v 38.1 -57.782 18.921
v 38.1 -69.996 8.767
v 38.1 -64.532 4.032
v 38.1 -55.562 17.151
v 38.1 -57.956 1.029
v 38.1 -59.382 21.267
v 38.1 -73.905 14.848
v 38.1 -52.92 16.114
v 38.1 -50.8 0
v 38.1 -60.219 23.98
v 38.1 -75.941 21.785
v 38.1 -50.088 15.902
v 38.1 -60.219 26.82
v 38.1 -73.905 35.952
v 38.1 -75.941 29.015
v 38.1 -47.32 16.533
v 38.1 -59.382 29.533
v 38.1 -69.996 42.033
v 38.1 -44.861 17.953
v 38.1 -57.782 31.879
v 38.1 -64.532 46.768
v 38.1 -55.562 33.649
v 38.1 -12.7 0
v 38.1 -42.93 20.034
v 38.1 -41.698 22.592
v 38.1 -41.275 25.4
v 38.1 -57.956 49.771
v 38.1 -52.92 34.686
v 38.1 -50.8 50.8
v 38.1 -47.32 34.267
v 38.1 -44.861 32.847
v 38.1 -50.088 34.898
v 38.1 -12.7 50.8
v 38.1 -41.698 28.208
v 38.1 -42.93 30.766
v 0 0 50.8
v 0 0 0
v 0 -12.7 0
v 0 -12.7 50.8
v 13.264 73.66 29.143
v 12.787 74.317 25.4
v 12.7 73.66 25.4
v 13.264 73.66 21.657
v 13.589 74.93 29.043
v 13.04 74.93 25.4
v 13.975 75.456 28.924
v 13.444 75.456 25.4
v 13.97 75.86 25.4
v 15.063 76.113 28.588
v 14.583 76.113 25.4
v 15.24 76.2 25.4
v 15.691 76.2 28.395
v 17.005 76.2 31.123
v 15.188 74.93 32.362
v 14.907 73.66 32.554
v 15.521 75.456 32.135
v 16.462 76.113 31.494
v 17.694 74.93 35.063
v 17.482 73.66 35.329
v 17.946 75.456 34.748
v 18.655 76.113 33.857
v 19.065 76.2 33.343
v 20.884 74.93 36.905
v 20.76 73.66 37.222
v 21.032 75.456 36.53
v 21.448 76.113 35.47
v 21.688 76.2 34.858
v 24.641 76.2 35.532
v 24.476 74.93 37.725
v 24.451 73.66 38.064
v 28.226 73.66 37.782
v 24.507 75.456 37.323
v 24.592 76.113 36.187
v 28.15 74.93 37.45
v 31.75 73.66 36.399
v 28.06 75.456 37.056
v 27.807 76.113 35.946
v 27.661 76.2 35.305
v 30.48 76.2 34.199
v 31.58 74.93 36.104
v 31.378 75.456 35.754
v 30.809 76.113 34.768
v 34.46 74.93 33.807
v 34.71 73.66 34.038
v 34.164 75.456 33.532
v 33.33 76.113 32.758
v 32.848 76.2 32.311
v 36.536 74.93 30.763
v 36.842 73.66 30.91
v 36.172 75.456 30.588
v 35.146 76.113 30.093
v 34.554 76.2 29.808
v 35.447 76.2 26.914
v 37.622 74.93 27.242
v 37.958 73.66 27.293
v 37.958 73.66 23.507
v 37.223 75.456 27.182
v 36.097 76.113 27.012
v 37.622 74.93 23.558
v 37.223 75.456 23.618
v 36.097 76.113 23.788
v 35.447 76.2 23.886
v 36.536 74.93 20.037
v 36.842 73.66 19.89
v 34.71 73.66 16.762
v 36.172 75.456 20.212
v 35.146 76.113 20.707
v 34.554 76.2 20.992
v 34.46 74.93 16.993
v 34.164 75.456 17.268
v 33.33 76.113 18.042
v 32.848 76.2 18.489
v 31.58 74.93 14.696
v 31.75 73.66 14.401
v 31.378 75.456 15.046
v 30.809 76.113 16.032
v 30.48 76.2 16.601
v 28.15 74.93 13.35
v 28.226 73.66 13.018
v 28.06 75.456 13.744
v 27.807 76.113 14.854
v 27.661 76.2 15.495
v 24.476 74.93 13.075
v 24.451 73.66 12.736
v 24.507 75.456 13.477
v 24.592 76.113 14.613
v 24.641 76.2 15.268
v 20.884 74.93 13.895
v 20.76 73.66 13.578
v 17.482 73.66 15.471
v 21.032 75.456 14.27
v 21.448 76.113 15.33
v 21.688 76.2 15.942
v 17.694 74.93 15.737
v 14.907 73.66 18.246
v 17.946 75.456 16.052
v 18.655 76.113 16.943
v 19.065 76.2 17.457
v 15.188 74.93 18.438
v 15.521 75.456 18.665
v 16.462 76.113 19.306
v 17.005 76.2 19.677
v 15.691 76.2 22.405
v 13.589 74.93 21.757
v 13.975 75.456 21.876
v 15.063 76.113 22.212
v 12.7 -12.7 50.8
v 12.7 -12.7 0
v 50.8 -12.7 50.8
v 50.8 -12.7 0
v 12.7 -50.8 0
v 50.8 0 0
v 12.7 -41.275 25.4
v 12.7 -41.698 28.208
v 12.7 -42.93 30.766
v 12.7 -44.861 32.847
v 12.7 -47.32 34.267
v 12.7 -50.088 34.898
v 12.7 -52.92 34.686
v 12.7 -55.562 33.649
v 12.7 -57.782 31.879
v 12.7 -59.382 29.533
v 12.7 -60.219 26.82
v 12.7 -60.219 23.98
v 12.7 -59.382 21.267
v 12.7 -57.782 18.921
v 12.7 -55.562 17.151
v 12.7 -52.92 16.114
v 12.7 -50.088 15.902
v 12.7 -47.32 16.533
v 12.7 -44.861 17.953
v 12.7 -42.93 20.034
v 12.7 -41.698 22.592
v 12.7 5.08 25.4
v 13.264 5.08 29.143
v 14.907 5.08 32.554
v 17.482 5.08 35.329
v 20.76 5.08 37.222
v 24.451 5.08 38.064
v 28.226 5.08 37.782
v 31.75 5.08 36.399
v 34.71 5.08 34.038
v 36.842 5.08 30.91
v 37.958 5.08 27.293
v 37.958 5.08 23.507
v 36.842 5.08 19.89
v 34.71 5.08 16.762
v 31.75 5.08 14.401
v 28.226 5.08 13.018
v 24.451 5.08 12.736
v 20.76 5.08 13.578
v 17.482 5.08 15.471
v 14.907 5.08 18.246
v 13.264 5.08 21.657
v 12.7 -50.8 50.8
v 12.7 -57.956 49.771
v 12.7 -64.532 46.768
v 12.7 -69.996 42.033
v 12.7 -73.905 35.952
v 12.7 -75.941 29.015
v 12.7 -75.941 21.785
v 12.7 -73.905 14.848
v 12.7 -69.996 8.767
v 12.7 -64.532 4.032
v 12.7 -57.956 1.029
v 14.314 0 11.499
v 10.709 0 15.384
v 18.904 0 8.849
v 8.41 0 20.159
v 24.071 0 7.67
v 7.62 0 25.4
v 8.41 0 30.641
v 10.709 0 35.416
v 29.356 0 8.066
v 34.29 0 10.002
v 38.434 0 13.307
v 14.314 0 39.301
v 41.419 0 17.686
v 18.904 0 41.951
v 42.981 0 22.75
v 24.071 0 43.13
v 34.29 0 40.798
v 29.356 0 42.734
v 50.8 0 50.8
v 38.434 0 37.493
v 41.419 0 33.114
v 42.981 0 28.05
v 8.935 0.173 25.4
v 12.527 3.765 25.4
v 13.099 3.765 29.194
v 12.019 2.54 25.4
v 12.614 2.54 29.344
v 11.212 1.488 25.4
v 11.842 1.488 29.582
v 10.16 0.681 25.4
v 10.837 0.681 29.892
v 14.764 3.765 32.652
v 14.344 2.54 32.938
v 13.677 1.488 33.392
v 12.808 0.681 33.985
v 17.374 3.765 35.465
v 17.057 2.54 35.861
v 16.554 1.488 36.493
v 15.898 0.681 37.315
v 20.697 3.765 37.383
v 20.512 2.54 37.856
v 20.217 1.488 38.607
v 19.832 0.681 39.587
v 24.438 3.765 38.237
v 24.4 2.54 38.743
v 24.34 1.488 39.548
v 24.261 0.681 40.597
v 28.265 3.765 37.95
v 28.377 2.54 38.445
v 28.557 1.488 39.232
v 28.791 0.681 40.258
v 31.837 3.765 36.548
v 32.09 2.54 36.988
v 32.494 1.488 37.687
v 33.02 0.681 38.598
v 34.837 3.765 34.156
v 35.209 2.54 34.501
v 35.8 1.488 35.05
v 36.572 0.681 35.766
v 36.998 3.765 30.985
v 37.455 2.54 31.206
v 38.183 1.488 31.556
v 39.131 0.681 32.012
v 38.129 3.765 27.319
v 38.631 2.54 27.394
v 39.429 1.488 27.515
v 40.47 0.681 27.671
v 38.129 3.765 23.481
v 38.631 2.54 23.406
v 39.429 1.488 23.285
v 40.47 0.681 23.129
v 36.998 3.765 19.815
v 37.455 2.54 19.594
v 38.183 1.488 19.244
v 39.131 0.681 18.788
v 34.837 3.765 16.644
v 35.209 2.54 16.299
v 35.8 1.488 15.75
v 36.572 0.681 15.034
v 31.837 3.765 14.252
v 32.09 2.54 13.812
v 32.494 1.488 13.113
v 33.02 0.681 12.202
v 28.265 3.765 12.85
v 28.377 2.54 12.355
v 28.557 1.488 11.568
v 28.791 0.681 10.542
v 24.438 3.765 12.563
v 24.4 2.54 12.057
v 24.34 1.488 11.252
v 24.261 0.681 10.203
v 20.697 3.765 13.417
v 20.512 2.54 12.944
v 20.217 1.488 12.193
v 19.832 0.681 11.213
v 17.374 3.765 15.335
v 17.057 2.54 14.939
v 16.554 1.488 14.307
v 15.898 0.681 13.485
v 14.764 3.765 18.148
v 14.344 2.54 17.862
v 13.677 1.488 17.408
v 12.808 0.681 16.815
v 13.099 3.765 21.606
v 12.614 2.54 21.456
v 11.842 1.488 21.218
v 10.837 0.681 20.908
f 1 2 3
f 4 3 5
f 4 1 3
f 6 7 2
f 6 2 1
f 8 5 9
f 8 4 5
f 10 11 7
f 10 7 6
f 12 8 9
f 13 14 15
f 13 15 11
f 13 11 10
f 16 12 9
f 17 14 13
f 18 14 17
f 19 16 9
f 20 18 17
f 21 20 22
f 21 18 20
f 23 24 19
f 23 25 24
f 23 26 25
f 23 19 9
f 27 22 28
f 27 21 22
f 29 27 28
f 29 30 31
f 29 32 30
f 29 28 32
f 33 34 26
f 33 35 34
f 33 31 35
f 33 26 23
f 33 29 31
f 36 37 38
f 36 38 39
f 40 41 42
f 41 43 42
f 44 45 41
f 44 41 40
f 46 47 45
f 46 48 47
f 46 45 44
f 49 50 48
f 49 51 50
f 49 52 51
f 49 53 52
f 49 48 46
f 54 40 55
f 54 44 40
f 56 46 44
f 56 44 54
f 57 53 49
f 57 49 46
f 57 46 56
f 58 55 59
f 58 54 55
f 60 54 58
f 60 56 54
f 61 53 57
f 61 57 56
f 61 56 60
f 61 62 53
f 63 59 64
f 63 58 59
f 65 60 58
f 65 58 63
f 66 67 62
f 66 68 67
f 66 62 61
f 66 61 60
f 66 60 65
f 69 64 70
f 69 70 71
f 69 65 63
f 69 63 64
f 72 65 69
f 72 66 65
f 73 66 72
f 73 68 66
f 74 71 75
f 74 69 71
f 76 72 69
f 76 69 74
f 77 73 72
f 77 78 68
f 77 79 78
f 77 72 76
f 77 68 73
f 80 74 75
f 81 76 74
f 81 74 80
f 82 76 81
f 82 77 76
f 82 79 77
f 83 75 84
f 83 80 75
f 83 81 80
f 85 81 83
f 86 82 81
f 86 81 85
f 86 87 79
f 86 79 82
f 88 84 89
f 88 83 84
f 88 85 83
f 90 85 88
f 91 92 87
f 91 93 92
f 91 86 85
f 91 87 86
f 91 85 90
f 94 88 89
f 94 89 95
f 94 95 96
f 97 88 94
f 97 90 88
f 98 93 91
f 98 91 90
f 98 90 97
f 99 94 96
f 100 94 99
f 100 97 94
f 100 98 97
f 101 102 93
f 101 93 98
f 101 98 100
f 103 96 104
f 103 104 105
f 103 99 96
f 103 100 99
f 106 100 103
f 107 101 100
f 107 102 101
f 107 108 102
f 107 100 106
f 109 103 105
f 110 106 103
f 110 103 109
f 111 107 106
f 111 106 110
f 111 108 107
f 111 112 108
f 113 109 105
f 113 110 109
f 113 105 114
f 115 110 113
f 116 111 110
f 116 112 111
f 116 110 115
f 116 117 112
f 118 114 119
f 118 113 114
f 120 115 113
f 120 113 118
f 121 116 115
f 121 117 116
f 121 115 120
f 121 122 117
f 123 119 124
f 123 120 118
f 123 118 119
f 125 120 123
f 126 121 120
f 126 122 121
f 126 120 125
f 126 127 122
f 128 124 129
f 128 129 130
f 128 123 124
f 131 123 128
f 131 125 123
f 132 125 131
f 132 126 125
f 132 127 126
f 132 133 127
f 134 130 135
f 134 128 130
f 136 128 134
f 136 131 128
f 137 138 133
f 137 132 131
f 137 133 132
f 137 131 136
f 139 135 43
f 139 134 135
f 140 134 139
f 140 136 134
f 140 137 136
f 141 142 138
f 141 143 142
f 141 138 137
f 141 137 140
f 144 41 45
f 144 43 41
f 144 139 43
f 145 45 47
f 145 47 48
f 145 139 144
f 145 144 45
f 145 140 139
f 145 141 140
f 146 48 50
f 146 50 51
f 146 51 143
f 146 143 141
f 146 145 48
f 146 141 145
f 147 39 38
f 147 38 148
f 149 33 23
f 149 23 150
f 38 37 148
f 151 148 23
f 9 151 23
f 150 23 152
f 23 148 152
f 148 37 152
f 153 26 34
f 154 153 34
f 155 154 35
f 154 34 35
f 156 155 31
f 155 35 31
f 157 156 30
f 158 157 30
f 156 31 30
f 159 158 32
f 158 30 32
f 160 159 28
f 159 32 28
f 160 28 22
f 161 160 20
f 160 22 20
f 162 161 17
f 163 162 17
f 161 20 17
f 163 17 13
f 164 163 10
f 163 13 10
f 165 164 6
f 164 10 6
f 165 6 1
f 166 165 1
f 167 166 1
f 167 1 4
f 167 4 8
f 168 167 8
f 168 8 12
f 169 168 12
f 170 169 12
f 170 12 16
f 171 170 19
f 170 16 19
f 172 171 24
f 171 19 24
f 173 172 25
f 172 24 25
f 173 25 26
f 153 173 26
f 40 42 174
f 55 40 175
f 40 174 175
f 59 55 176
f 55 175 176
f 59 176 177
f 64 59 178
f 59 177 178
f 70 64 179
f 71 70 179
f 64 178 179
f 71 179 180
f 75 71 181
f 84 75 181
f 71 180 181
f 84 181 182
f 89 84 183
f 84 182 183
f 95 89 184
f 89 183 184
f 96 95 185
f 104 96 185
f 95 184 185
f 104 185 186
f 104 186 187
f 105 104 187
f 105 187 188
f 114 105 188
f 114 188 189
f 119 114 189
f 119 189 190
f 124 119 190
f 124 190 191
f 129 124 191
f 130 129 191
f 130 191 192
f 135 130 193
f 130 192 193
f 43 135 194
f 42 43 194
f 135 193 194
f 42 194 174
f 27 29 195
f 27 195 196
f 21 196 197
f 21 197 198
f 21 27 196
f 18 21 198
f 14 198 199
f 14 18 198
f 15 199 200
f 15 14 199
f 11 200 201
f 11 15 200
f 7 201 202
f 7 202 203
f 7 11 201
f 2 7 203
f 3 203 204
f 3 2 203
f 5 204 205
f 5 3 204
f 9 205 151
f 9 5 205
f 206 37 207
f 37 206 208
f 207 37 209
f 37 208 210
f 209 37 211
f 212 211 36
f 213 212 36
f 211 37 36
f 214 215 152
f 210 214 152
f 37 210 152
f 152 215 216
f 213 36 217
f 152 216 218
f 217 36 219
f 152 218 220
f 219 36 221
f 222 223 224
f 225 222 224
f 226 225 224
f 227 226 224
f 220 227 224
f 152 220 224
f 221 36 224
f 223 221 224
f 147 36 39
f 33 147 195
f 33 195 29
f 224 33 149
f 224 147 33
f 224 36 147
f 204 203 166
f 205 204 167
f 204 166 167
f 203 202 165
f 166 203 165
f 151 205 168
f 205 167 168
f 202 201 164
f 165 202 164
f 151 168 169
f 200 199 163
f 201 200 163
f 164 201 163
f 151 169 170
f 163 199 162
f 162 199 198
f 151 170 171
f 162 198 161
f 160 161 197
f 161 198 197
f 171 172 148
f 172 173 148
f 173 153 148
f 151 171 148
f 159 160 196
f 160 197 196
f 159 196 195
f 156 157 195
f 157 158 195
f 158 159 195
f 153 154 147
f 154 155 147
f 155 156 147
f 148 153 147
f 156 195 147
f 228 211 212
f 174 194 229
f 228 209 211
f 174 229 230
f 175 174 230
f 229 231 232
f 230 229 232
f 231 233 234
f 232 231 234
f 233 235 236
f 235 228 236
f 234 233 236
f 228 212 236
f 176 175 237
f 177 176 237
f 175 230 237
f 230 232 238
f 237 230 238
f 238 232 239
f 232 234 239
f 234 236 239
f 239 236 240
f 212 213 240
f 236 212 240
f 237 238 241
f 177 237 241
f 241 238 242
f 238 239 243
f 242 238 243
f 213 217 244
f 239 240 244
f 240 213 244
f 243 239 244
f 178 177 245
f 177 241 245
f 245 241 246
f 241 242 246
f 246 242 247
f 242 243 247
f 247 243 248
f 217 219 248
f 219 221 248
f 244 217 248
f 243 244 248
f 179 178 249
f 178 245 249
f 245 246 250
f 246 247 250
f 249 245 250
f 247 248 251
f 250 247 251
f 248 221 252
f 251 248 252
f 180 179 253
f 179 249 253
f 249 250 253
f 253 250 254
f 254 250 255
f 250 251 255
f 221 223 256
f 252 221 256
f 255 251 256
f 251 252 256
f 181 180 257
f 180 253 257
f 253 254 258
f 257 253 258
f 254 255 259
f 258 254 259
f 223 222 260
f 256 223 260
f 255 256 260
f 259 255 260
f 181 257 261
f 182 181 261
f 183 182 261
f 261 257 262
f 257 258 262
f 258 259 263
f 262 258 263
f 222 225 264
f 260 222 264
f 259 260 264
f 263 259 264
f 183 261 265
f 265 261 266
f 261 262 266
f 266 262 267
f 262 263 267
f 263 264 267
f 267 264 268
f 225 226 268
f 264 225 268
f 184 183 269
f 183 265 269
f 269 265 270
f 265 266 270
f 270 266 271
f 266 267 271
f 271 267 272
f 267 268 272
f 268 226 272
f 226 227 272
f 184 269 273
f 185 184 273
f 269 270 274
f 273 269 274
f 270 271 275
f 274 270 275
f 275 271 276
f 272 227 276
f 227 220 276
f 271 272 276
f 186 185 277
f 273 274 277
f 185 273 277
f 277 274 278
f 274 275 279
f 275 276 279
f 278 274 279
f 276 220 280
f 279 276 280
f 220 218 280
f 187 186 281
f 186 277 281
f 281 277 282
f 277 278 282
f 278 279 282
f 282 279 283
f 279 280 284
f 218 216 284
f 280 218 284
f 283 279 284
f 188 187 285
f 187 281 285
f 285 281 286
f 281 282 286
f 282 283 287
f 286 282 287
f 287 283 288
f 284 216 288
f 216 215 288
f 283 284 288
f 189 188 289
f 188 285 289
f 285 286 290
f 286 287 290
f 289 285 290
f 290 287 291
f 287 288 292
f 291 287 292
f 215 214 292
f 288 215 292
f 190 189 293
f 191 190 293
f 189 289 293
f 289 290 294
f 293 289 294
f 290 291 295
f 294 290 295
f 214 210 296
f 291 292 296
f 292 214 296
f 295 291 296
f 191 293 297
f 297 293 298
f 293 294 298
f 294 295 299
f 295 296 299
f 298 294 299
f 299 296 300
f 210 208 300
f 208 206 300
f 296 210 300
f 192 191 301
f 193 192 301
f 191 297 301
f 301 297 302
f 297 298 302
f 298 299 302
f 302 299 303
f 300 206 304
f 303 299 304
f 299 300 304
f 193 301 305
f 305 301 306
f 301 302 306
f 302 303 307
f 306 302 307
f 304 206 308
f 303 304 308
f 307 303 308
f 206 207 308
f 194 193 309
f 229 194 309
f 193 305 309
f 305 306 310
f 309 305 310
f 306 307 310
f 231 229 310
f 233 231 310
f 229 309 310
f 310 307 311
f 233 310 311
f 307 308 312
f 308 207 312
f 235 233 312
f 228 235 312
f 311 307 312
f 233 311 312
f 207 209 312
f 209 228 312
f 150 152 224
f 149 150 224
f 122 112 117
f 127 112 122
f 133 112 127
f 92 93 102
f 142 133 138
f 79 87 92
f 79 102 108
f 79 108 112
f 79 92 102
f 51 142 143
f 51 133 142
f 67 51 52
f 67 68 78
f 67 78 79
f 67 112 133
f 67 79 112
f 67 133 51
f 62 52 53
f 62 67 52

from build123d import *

# Parameters (mm, degrees)
F0_W     = 50.8
F0_H     = 50.8
F1_DEPTH = 12.7
F2_W     = 12.7
F2_H     = 50.8
F3_DEPTH = 38.1
F5_DEPTH = 25.4
F6_R     = 9.525
F7_DEPTH = 25.4
F8_R     = 12.7
F9_DEPTH = 76.2
F10_R    = 2.54
F11_R    = 5.08


with BuildPart() as f1:
    # F0 (on Front) → F1 (new body)
    with BuildSketch(Plane.XZ):
        with Locations((25.4, 25.4)):
            Rectangle(F0_W, F0_H)
    extrude(amount=F1_DEPTH)

    # F2 (on face) → F3 (join)
    with BuildSketch(Plane.XZ.offset(12.7)):
        with Locations((19.05, 25.4)):
            Rectangle(F2_W, F2_H)
        with Locations((31.75, 25.4)):
            Rectangle(F2_W, F2_H)
    extrude(amount=F3_DEPTH)

    # F4 (on face) → F5 (join)
    with BuildSketch(Plane.YZ.offset(38.1)):
        with BuildLine():
            Line((-50.8, 0), (-50.8, 50.8))
            ThreePointArc((-50.8, 50.8), (-76.2, 25.4), (-50.8, 0))
        make_face()
    extrude(amount=-F5_DEPTH)

    # F6 (on face) → F7 (cut)
    with BuildSketch(Plane.YZ.offset(38.1)):
        with Locations((-50.8, 25.4)):
            Circle(F6_R)
    extrude(amount=-F7_DEPTH, mode=Mode.SUBTRACT)

    # F8 (on face) → F9 (join)
    with BuildSketch(Plane(origin=(0, 0, 0), x_dir=(-1, 0, 0), z_dir=(0, 1, 0))):
        with Locations((-25.4, 25.4)):
            Circle(F8_R)
    extrude(amount=F9_DEPTH)

    # F10
    f10_edges = [f1.edges().sort_by_distance(p)[0] for p in [
        (38.1, 76.2, 25.4),
    ]]
    fillet(f10_edges, radius=F10_R)

    # F11
    f11_edges = [f1.edges().sort_by_distance(p)[0] for p in [
        (12.7, 36.83, 25.4),
        (38.1, 73.66, 25.4),
        (38.1, 0, 25.4),
    ]]
    fillet(f11_edges, radius=F11_R)


solid = f1.part
